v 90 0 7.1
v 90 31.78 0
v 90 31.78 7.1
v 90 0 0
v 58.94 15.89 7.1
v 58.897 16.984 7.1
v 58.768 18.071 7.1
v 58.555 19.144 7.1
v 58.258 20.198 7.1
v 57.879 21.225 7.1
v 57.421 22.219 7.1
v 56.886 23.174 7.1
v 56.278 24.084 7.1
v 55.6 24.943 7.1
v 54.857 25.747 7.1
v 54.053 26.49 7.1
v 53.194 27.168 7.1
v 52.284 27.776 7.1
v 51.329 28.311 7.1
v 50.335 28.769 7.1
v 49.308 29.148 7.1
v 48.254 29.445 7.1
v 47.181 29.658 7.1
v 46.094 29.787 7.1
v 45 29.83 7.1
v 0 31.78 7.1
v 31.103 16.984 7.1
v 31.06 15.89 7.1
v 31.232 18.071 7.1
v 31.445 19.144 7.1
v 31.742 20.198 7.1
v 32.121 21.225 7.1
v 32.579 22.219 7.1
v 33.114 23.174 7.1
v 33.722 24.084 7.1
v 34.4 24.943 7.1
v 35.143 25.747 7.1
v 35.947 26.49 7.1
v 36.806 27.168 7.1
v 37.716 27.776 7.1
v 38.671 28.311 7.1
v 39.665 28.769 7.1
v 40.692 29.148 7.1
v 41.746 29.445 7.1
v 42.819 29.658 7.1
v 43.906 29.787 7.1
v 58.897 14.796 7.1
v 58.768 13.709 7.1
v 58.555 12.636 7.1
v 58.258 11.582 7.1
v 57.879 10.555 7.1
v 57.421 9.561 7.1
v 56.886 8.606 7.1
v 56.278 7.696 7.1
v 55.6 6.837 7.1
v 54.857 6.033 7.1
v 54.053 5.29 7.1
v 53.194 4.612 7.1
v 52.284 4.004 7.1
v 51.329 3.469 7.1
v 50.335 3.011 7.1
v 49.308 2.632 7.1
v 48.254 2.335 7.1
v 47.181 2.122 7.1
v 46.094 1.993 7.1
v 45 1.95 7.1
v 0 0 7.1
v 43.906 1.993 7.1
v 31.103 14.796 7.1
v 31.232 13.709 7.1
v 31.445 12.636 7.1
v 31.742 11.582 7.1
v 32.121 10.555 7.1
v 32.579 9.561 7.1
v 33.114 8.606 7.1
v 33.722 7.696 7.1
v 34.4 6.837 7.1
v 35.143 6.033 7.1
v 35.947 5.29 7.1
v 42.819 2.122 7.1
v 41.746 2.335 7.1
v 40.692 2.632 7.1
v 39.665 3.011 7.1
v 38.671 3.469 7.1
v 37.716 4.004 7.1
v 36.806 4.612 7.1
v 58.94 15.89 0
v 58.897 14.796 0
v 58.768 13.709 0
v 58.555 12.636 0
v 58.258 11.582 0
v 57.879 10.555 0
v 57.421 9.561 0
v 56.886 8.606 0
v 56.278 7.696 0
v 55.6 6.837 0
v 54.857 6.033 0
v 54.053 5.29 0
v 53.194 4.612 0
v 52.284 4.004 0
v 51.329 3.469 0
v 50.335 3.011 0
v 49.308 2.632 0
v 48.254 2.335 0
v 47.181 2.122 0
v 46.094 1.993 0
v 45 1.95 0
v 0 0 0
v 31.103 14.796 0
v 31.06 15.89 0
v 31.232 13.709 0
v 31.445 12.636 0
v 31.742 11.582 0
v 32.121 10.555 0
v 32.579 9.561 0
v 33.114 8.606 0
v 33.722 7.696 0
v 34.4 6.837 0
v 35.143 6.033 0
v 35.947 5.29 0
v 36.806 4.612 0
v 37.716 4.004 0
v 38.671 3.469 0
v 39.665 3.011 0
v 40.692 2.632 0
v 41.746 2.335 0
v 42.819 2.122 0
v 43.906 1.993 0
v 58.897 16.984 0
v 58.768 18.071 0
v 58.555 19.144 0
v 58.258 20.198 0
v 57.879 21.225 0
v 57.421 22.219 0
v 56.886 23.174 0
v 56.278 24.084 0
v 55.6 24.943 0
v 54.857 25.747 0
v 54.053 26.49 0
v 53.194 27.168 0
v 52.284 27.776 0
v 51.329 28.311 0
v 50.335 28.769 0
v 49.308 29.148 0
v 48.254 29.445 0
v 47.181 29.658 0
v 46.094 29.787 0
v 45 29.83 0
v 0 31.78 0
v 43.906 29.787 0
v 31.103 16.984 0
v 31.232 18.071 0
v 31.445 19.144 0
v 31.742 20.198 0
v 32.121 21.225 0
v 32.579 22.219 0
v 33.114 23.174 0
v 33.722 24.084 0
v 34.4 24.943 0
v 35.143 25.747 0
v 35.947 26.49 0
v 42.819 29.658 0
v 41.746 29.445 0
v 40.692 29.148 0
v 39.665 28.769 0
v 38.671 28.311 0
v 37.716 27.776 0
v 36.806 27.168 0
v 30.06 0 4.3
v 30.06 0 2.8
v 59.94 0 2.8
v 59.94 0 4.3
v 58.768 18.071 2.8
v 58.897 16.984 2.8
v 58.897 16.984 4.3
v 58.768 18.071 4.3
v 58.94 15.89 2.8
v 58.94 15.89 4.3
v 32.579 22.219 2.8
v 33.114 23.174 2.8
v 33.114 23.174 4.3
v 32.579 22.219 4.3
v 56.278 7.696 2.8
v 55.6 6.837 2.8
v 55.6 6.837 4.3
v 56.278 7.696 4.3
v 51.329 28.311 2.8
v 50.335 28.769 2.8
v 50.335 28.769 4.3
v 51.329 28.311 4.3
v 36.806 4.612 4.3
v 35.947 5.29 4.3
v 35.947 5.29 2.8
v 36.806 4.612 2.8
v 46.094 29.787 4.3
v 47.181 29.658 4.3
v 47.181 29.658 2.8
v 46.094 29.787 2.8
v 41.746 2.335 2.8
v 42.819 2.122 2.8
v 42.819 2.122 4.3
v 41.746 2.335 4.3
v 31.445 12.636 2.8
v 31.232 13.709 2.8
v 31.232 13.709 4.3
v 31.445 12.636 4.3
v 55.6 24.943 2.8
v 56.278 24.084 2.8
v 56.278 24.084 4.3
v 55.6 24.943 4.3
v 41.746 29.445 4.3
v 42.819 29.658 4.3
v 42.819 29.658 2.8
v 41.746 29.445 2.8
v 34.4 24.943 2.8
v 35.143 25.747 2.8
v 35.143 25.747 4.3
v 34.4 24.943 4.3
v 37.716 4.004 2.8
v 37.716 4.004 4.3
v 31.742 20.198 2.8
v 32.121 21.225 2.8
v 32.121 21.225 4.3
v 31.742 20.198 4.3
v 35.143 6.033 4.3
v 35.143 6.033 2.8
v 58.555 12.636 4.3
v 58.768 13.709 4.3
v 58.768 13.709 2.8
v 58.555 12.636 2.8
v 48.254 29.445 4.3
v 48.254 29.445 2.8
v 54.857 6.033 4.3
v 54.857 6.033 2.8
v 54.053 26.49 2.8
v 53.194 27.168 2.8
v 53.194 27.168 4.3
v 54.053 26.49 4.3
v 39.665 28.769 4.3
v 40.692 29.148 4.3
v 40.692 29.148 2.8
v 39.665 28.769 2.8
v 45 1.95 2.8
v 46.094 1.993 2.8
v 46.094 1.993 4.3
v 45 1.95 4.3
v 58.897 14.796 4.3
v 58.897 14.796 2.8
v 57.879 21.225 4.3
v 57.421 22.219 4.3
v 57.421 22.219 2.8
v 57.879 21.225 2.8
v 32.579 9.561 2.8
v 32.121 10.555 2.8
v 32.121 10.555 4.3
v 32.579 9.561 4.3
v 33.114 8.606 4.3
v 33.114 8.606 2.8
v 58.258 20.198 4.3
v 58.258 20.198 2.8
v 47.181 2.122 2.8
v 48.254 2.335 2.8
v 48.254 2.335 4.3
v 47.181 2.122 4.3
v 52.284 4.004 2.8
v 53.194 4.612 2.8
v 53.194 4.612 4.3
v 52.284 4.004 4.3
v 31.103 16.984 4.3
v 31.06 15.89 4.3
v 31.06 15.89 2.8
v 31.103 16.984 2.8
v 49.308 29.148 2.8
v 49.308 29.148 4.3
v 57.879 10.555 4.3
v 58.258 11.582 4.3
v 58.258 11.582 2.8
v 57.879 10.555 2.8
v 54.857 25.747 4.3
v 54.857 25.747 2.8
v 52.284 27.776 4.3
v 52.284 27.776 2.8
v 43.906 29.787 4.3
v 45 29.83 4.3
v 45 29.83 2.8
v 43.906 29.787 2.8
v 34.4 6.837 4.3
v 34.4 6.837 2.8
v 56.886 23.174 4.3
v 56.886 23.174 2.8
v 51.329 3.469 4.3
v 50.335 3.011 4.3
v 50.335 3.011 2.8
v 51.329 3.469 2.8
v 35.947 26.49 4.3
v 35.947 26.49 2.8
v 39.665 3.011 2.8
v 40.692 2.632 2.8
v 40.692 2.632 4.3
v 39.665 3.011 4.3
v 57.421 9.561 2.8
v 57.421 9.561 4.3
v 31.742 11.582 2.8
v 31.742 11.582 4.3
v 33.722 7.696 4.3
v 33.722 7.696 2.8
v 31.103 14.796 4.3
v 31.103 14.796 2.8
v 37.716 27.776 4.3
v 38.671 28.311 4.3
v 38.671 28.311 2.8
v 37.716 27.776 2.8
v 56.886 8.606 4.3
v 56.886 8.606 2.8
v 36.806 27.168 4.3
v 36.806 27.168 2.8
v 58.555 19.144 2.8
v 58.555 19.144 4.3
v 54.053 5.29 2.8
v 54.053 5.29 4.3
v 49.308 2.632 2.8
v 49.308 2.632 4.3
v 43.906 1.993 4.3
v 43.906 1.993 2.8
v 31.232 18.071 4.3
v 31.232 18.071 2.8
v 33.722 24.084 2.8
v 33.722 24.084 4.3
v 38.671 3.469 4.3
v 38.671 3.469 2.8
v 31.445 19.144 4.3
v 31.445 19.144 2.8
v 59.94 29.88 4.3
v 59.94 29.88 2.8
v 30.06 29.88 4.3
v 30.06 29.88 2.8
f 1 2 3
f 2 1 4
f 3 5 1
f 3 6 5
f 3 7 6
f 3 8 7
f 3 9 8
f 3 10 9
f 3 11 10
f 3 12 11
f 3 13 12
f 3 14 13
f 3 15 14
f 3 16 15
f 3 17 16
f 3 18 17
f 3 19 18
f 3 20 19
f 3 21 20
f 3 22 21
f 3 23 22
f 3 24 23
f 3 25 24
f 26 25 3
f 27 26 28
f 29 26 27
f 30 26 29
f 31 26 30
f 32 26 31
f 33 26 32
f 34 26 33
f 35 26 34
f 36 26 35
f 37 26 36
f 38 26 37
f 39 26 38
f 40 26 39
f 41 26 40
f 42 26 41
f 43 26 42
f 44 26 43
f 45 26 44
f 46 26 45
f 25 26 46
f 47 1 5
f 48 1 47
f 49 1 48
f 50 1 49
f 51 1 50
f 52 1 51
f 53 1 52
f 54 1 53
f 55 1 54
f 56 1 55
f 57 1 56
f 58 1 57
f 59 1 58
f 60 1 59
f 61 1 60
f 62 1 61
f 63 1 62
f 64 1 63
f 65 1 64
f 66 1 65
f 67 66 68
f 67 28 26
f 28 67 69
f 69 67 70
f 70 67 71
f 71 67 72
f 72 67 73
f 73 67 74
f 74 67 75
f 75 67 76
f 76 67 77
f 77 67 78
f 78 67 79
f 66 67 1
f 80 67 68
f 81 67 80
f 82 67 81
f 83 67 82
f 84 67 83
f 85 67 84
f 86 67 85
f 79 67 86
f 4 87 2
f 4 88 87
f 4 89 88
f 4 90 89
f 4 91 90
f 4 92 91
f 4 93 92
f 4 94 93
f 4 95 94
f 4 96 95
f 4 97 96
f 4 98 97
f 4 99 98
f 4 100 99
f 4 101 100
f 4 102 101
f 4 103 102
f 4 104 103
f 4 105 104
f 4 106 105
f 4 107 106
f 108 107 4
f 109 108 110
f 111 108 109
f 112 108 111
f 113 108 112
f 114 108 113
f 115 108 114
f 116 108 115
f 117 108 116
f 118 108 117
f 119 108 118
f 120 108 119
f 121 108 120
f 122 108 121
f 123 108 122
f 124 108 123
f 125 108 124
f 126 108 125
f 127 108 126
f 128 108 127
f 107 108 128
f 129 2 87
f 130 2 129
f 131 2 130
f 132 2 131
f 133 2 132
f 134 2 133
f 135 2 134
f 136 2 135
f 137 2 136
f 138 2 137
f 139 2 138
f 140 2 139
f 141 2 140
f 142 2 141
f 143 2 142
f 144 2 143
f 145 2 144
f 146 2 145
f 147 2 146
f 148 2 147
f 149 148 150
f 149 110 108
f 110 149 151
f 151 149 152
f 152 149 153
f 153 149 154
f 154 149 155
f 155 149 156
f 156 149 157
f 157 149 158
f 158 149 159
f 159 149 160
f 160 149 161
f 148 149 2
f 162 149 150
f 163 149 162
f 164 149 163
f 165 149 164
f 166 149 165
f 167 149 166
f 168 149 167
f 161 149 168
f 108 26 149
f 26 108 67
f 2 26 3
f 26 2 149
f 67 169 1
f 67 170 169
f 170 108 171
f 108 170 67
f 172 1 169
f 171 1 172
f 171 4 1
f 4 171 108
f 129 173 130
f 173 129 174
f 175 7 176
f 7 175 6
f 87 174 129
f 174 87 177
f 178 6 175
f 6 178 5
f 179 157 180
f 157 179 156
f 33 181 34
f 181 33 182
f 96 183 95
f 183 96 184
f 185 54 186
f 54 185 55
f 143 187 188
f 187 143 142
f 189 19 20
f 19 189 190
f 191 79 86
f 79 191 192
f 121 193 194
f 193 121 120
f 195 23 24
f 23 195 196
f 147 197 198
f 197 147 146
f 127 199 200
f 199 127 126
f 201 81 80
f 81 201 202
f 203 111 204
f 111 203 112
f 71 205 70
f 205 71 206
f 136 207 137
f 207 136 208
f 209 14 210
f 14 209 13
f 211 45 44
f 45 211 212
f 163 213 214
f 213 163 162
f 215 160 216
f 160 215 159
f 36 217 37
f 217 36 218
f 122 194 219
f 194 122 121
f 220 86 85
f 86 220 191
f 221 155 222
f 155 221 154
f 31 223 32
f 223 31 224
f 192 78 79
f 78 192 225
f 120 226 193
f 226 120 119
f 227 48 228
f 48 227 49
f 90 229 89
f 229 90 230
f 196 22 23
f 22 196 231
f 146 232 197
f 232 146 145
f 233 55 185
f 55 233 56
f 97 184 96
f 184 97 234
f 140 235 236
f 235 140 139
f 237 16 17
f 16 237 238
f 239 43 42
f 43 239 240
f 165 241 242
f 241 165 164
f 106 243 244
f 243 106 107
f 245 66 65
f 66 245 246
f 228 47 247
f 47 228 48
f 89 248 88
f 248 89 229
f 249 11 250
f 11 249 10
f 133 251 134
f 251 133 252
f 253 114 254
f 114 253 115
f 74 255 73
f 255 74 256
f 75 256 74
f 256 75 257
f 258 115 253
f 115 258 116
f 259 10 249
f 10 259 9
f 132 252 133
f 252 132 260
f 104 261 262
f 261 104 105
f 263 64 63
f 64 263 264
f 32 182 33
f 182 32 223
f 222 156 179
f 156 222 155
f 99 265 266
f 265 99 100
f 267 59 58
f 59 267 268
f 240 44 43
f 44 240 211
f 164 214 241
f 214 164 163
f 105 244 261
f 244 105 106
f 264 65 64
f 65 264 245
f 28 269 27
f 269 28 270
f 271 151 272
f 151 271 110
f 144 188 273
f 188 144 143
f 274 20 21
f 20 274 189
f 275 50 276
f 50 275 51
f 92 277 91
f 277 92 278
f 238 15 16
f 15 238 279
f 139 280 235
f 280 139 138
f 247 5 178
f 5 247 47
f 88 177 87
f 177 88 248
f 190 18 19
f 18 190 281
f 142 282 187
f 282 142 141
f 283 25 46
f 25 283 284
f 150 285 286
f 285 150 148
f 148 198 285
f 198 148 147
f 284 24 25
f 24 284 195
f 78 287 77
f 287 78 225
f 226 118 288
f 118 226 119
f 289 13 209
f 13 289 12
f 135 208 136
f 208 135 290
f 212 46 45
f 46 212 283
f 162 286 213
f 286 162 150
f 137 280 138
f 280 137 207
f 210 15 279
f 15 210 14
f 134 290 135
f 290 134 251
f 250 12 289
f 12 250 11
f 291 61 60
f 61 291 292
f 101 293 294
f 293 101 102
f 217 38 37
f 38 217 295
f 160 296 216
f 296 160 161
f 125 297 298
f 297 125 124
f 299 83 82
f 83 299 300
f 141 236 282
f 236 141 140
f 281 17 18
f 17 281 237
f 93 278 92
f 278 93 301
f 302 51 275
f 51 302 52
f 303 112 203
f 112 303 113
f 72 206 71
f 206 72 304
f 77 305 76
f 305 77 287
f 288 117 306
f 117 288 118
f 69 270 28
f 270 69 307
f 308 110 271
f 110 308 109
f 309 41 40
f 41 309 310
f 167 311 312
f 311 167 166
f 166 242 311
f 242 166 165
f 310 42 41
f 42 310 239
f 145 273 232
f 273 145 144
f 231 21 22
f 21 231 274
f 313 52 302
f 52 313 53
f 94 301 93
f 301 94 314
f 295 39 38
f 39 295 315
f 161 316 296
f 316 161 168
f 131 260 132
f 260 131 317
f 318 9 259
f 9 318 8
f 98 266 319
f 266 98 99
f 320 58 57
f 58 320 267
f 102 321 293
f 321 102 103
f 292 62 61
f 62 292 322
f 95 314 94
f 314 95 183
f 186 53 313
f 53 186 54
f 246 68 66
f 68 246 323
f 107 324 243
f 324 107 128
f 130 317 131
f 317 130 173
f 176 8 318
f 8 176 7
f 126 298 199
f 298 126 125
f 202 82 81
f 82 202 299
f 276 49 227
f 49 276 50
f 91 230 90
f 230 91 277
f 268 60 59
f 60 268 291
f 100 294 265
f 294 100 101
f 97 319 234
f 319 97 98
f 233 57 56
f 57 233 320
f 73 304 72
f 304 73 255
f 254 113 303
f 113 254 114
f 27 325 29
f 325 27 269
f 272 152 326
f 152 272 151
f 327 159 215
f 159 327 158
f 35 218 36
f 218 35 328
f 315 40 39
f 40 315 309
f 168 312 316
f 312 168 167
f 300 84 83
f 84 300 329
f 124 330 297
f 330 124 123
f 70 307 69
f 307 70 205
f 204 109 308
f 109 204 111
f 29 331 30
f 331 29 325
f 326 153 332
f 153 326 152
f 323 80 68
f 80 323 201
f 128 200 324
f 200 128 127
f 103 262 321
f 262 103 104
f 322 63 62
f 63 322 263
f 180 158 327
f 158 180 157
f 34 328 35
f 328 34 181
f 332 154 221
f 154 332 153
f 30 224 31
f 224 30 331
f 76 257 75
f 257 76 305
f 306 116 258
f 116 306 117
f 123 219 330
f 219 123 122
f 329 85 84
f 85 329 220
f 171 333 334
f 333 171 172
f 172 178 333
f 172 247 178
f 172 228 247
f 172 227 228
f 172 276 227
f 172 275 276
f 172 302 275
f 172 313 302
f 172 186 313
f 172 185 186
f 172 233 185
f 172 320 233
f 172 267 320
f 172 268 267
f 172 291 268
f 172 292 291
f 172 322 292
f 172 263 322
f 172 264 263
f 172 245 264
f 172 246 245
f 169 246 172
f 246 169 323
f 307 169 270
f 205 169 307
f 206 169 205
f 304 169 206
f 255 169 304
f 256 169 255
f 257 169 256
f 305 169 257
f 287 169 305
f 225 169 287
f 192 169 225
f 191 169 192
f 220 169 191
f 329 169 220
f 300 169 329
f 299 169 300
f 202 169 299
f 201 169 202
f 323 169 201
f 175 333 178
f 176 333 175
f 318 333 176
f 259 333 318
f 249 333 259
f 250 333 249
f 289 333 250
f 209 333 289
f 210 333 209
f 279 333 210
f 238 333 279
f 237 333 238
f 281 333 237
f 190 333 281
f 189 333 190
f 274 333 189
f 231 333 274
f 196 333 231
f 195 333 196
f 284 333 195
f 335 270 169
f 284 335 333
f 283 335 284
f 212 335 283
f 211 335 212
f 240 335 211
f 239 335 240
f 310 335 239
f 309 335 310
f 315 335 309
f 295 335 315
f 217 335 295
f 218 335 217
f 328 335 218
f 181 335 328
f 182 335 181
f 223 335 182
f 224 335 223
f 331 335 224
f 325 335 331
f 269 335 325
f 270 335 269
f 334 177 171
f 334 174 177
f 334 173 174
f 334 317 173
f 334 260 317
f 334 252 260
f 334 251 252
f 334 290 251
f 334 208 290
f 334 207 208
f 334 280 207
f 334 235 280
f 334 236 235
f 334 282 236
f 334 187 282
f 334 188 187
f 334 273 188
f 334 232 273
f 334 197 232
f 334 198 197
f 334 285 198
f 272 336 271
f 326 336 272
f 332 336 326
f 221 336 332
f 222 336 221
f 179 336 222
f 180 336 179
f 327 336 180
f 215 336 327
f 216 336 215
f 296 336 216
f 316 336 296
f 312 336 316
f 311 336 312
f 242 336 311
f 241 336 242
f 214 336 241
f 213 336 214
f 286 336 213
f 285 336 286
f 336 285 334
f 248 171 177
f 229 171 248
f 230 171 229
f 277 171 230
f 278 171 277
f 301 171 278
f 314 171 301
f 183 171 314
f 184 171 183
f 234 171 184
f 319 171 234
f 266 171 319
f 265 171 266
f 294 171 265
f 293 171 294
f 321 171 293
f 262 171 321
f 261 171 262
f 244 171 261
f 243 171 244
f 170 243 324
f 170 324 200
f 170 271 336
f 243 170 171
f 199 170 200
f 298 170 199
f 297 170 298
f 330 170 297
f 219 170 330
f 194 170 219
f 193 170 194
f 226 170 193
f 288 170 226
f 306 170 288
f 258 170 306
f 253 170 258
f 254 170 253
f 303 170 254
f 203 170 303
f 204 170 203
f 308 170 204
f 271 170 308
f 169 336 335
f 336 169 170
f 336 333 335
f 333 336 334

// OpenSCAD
$fn = 80;
depth = 7.10;
circd = 27.88;
circr = circd / 2;
leng = 90;

difference() {
	cube([leng, 31.78, depth]);
	translate([leng / 2, (31.78 - circr) - ((31.78 - circd)/2), 0])
		cylinder(depth, r = 27.88 / 2);
	_circd = circd + 2;
	translate([(90 / 2) - (_circd / 2), 0, (depth / 2) - (1.5/2)])
		cube([_circd, _circd, 1.5]);
}
